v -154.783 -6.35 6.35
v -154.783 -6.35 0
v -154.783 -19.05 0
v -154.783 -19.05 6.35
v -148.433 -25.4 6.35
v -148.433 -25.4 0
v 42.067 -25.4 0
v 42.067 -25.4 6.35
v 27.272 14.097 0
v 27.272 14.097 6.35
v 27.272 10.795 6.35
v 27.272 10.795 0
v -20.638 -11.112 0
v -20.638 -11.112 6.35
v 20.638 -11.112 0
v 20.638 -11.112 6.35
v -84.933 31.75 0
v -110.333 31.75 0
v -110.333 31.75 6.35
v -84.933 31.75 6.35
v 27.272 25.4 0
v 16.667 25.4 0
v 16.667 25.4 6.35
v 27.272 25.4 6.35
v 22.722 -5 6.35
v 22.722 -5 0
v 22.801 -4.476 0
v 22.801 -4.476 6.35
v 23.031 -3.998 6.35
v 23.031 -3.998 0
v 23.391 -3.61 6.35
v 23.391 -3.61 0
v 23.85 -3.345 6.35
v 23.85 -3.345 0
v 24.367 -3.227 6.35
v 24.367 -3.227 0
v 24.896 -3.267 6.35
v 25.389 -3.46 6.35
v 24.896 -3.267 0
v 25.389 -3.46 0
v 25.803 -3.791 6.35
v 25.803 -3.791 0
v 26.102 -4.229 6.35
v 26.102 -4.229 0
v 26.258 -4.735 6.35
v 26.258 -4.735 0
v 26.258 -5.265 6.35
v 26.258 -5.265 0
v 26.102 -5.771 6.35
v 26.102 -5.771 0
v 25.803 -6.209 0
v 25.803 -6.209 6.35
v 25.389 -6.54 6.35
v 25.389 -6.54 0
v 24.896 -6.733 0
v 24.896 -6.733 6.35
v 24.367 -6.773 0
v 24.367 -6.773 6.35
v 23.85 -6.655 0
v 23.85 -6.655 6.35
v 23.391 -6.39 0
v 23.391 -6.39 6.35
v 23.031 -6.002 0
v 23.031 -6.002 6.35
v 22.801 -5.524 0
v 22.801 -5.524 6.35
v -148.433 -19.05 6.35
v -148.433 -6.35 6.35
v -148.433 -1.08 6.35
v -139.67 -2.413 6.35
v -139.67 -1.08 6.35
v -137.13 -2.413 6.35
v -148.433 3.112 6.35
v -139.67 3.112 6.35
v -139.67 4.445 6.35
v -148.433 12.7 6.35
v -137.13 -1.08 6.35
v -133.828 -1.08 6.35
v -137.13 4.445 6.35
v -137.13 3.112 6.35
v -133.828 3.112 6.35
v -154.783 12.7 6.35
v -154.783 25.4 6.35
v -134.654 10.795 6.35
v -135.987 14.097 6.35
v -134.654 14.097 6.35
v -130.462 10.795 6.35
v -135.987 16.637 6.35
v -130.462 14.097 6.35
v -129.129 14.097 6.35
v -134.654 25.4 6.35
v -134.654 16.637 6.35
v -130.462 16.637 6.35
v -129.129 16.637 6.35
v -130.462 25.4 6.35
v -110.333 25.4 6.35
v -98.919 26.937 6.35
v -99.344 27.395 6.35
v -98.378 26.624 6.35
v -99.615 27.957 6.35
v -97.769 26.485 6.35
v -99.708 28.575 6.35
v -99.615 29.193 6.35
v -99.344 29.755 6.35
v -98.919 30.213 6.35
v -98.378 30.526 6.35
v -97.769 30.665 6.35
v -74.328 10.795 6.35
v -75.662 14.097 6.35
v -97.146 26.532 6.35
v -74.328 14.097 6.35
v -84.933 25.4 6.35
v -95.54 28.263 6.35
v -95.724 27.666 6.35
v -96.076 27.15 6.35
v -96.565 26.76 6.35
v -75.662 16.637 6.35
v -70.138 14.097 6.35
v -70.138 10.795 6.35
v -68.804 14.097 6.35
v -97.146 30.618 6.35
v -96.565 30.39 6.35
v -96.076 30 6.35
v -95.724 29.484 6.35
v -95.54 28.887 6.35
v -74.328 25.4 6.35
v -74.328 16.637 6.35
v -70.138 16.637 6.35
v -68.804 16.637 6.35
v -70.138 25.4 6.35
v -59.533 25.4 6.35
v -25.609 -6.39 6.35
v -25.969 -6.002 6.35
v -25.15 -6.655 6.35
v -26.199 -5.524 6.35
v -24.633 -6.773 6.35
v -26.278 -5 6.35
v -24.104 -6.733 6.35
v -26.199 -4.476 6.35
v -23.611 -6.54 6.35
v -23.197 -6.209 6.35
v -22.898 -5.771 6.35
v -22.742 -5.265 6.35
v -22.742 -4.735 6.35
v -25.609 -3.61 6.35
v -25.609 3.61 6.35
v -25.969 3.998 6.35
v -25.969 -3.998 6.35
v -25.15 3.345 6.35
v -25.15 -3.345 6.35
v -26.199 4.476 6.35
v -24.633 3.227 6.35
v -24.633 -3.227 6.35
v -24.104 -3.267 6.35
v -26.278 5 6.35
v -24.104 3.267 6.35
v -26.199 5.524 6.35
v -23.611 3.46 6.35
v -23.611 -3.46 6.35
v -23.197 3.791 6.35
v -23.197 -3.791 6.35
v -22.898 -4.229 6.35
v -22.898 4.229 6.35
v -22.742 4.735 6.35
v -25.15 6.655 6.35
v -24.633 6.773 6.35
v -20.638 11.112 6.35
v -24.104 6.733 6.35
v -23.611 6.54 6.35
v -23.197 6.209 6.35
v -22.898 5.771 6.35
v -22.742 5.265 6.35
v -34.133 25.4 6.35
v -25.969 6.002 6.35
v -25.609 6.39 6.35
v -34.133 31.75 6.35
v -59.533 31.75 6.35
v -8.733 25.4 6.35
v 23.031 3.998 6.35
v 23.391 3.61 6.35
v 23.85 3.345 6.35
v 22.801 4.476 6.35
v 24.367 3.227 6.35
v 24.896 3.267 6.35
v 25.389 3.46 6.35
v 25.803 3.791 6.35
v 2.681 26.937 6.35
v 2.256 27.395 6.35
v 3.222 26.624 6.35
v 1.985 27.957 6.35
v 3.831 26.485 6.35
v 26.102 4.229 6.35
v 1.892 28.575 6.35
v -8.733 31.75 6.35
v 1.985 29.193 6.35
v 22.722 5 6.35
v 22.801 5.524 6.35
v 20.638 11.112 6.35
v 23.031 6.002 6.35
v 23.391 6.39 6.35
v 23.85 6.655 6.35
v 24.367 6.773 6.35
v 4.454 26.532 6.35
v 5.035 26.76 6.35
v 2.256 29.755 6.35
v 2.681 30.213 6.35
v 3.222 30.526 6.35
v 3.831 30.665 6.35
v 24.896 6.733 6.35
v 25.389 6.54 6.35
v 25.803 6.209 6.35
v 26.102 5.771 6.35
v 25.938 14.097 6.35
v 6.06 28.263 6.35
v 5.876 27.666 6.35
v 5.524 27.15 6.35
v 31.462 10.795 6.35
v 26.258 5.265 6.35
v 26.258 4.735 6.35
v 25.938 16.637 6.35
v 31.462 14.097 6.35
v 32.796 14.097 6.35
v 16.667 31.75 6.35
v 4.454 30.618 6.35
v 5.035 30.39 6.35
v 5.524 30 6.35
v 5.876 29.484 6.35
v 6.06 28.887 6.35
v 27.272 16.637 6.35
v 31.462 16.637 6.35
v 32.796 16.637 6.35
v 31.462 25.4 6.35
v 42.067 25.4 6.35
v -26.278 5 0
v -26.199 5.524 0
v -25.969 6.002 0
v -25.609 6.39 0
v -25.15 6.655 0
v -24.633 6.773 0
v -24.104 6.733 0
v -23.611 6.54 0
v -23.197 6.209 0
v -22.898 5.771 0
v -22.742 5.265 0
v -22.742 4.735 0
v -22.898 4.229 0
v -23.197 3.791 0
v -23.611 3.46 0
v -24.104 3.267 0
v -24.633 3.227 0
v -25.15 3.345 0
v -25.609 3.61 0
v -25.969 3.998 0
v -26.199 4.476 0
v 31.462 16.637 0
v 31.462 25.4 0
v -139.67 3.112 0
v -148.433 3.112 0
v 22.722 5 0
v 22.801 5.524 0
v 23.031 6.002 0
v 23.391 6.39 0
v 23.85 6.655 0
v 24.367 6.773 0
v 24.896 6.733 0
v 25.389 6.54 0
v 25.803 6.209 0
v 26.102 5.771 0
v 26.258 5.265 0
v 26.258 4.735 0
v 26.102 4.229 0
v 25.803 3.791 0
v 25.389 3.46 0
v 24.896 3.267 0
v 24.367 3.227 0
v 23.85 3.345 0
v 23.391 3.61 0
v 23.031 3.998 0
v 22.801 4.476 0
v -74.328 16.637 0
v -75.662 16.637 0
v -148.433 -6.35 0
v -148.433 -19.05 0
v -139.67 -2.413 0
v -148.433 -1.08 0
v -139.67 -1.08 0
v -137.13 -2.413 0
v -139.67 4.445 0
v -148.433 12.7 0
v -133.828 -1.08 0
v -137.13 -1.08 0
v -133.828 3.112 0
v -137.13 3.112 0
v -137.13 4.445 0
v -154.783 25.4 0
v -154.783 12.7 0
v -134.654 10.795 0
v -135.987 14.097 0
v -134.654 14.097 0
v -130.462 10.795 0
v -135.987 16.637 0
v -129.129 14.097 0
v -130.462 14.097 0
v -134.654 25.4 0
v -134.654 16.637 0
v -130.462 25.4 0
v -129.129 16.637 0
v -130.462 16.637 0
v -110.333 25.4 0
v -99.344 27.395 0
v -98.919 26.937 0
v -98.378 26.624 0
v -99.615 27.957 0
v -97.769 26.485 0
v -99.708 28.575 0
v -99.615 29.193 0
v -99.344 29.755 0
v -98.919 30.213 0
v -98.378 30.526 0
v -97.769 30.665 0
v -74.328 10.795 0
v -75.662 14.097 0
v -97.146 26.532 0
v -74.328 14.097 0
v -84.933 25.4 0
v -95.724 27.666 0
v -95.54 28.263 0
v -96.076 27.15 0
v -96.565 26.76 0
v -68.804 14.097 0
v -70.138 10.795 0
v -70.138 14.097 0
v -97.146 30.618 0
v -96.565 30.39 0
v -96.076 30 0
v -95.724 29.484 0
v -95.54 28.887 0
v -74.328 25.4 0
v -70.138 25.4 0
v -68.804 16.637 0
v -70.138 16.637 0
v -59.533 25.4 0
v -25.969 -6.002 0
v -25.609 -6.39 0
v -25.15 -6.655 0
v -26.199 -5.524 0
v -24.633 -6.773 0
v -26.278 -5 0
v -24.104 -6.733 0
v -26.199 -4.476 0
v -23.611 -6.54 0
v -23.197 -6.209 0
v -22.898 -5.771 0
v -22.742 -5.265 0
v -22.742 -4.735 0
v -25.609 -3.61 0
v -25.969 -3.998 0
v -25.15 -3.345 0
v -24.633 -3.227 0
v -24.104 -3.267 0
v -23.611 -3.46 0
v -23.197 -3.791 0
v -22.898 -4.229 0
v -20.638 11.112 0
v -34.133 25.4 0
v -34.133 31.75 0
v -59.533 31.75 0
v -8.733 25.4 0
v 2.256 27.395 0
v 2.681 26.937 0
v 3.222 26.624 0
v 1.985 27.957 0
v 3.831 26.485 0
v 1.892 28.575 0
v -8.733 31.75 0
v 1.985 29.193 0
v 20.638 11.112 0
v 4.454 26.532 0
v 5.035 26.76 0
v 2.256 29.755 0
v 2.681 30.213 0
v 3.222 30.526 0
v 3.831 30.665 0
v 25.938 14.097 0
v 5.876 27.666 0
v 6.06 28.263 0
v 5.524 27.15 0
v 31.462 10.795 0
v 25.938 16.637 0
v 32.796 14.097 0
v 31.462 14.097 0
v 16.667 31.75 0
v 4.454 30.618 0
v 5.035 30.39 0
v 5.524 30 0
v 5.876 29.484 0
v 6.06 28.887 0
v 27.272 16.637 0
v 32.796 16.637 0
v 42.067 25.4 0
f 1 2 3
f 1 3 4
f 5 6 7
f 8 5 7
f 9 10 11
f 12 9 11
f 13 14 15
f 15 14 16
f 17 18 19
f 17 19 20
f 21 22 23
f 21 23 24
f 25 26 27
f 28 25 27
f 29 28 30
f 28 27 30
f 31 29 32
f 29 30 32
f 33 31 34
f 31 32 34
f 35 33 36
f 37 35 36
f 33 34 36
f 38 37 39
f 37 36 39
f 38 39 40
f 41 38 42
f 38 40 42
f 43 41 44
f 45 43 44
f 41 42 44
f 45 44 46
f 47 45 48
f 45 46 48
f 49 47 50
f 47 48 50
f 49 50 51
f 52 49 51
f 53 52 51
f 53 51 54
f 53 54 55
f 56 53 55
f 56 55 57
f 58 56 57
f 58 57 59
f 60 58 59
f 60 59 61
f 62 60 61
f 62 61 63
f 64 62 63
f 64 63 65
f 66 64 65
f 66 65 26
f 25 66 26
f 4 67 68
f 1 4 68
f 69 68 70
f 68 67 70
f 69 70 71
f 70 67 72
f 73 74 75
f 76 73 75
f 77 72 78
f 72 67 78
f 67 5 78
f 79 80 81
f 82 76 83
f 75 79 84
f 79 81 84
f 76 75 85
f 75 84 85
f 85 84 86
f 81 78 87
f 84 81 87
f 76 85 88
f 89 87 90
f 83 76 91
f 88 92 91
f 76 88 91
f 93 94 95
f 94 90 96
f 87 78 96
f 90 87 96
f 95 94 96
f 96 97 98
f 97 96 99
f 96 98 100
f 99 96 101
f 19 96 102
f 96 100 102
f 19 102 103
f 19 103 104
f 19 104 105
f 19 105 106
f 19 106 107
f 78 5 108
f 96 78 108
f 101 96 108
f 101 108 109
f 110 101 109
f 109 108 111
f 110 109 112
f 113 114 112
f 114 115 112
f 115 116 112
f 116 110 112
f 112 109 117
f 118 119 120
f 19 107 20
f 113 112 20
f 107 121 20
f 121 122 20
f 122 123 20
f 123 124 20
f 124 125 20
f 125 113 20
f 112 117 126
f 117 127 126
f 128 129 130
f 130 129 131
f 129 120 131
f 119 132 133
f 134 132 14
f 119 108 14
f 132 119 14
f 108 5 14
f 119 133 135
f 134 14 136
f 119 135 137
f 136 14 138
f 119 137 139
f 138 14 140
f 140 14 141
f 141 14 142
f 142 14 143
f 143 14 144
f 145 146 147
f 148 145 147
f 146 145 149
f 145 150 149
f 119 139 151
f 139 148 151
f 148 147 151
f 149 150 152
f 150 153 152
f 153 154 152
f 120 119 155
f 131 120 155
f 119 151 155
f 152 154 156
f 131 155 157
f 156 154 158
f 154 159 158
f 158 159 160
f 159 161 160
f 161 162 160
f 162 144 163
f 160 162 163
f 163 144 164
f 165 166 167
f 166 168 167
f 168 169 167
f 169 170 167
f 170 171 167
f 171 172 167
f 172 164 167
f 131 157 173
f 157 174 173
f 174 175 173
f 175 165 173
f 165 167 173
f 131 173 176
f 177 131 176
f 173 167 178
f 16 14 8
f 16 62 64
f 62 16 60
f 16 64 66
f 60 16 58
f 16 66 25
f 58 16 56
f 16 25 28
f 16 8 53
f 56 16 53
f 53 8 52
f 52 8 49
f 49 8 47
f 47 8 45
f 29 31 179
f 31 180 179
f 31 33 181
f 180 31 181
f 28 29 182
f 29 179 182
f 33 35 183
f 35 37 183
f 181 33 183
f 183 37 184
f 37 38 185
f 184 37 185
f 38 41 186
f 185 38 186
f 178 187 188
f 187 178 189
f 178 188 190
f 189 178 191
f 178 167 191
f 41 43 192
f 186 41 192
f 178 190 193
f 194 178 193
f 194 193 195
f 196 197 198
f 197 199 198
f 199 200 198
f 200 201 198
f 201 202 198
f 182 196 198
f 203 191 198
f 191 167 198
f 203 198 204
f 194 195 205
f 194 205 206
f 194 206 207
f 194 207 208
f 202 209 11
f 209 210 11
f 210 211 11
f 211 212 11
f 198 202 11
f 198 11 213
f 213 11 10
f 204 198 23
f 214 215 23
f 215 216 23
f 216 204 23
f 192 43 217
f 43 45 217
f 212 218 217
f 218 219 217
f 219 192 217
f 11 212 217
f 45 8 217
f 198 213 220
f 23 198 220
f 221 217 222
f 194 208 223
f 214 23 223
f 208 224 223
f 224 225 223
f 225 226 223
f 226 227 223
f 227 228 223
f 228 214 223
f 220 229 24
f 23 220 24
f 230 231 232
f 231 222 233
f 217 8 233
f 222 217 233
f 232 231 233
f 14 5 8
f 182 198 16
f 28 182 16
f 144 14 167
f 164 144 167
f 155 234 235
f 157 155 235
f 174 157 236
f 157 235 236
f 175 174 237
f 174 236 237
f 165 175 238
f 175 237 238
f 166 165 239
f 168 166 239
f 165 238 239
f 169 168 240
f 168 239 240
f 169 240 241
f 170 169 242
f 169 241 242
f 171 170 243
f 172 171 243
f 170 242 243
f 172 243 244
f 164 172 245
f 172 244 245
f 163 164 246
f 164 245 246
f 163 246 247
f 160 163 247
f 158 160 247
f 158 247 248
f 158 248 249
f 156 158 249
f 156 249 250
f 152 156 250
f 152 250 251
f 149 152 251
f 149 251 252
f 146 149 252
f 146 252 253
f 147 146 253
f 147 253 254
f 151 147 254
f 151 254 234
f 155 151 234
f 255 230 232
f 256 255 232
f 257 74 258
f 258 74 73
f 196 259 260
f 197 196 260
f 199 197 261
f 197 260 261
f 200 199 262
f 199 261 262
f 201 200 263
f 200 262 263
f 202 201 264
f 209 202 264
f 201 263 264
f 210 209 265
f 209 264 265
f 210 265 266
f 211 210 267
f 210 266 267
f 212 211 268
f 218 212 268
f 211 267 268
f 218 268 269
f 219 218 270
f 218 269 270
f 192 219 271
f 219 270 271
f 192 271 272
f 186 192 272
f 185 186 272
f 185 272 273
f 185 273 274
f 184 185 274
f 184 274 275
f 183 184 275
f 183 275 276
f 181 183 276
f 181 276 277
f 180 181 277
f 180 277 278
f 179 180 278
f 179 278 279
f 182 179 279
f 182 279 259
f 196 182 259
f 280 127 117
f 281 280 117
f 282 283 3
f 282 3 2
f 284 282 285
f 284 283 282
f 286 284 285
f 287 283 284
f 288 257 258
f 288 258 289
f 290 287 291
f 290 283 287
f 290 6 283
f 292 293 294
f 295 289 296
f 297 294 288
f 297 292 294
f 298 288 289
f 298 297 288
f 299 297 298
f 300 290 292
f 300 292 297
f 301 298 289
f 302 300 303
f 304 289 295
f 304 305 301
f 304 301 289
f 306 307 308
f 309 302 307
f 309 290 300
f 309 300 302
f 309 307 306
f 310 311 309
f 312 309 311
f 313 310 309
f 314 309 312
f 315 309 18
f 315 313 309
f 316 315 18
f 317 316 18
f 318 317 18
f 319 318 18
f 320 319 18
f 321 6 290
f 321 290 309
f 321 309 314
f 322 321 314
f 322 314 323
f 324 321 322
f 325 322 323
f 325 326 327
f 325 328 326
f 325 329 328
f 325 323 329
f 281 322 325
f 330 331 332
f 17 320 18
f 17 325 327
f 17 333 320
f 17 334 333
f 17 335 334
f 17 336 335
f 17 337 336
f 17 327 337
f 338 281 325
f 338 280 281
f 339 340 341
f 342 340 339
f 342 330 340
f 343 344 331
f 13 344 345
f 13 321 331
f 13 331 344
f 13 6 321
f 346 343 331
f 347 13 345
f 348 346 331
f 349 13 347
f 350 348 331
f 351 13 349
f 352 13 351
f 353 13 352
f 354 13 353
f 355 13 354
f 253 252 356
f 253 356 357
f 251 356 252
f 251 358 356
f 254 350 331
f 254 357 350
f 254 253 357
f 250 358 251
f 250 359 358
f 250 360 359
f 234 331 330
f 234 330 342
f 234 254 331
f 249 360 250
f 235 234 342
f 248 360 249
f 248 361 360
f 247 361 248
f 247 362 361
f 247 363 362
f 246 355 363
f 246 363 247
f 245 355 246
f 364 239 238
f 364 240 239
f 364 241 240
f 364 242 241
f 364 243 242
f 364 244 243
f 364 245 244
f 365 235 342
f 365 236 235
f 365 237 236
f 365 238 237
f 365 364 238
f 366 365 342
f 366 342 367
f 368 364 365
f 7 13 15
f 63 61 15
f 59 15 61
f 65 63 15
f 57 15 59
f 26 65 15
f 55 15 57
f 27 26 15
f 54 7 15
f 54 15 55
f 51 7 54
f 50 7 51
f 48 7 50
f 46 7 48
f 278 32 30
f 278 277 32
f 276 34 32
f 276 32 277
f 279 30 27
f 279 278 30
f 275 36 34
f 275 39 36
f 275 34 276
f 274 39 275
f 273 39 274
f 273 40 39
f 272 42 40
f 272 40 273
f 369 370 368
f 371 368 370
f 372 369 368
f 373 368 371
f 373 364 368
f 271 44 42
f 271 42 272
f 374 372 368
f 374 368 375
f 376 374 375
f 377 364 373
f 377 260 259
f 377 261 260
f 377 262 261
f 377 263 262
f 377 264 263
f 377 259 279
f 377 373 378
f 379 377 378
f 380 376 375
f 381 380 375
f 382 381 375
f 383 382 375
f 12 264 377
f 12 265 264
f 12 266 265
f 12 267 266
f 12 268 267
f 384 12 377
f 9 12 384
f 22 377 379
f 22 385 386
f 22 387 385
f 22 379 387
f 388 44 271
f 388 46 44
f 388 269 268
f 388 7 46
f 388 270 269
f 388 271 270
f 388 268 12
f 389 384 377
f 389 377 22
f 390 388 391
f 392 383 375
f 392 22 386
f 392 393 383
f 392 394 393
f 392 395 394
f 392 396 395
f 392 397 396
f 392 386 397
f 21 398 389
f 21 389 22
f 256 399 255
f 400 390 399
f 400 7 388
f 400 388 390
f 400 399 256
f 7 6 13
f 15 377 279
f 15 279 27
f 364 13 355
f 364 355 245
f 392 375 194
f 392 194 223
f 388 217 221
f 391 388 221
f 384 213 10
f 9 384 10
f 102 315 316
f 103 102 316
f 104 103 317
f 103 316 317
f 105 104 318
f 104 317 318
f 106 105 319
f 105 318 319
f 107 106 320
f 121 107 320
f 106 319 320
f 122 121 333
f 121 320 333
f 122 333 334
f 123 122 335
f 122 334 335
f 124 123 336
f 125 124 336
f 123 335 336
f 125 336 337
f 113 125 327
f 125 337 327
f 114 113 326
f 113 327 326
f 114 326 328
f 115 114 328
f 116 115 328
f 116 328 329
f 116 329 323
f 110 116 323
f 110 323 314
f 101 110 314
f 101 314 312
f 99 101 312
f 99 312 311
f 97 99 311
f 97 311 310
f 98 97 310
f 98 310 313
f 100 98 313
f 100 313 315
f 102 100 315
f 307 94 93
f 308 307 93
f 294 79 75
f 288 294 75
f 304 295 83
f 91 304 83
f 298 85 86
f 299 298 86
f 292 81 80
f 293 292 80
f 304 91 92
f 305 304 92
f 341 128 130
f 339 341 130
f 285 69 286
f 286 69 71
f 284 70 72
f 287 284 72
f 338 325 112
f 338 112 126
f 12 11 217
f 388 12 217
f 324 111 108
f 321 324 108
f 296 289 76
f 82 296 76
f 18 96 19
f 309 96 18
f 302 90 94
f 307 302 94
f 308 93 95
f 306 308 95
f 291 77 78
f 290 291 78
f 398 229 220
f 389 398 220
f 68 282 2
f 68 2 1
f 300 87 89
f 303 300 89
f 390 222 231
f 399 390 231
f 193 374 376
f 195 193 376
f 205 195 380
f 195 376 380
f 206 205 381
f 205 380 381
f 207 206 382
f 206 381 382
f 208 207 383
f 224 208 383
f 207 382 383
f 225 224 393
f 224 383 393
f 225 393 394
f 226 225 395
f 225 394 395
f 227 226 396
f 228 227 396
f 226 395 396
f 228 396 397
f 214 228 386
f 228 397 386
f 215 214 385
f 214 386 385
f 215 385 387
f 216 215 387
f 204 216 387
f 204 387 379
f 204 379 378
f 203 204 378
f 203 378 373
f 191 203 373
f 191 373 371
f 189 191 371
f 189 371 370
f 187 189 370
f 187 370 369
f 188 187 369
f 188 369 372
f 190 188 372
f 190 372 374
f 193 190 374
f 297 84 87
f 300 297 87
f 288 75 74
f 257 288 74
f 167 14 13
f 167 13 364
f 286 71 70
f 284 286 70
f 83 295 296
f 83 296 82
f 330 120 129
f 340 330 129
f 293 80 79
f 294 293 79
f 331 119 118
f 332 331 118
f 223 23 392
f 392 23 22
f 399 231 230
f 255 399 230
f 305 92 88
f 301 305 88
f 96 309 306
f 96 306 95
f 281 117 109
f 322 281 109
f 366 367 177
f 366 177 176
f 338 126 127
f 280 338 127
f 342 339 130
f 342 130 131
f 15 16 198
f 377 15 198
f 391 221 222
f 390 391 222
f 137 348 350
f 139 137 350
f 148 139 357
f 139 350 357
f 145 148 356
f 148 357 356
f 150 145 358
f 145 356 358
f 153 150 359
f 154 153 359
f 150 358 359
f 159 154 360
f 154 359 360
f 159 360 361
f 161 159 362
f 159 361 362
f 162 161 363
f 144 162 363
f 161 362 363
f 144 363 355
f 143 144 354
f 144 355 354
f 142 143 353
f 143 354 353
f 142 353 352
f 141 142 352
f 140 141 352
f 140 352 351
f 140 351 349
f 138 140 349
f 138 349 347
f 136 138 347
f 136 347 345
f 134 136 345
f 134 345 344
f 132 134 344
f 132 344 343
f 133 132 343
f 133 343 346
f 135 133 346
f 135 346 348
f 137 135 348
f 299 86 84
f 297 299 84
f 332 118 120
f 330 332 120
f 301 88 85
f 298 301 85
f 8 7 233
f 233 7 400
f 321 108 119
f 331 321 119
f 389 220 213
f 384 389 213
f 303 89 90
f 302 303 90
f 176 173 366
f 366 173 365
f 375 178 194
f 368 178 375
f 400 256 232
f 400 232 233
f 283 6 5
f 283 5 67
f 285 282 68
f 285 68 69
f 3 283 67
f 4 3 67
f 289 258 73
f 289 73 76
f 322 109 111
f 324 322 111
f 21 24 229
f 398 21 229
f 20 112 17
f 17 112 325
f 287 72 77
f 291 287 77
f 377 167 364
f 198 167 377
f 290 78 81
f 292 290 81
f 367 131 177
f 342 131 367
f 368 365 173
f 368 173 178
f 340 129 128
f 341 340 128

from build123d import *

# Parameters (mm, degrees)
SKETCH1_W           = 190.5
SKETCH1_H           = 50.8
BOSS_EXTRUDE1_DEPTH = 6.35
SKETCH2_W           = 41.275
SKETCH2_H           = 22.225
CUT_EXTRUDE1_DEPTH  = 151.724377554
SKETCH3_W           = 25.4
SKETCH3_H           = 6.35
BOSS_EXTRUDE2_DEPTH = 6.35
LPATTERN1_COUNT     = 3
LPATTERN1_PITCH     = 50.8
SKETCH4_W           = 6.35
SKETCH4_H           = 12.7
BOSS_EXTRUDE3_DEPTH = 6.35
LPATTERN2_COUNT     = 2
LPATTERN2_PITCH     = 31.75
CUT_EXTRUDE2_DEPTH  = 6.35
SKETCH6_R           = 2.0955
CUT_EXTRUDE3_DEPTH  = 159.133368044
CUT_EXTRUDE4_DEPTH  = 159.133368044
SKETCH8_R           = 1.778
CUT_EXTRUDE5_DEPTH  = 159.133368044


with BuildPart() as part:
    # Sketch1 → Boss-Extrude1 (new body)
    with BuildSketch(Plane.XY):
        with Locations((-53.183, 0)):
            Rectangle(SKETCH1_W, SKETCH1_H)
    extrude(amount=BOSS_EXTRUDE1_DEPTH)

    # Sketch2 → Cut-Extrude1 (cut, through all)
    with BuildSketch(Plane.XY.offset(6.35)):
        Rectangle(SKETCH2_W, SKETCH2_H)
    extrude(amount=-CUT_EXTRUDE1_DEPTH, mode=Mode.SUBTRACT)

    # Sketch3 → Boss-Extrude2 (add)
    with BuildSketch(Plane(origin=(0, 25.4, 0), x_dir=(1, 0, 0), z_dir=(0, 1, 0))):
        with Locations((3.967, -3.175)):
            Rectangle(SKETCH3_W, SKETCH3_H)
    boss_extrude2 = extrude(amount=BOSS_EXTRUDE2_DEPTH)

    # LPattern1: Boss-Extrude2 ×3
    with Locations(*[(-i * LPATTERN1_PITCH, 0, 0) for i in range(1, LPATTERN1_COUNT)]):
        add(boss_extrude2)

    # Sketch4 → Boss-Extrude3 (add)
    with BuildSketch(Plane.ZY.offset(148.433)):
        with Locations((3.175, 19.05)):
            Rectangle(SKETCH4_W, SKETCH4_H)
    boss_extrude3 = extrude(amount=BOSS_EXTRUDE3_DEPTH)

    # LPattern2: Boss-Extrude3 ×2
    with Locations(*[(0, -i * LPATTERN2_PITCH, 0) for i in range(1, LPATTERN2_COUNT)]):
        add(boss_extrude3)

    # Sketch5 → Cut-Extrude2 (cut)
    with BuildSketch(Plane.XY.offset(6.35)):
        Polygon((31.4625, 25.4), (27.2715, 25.4), (27.2715, 16.637), (25.938, 16.637), (25.938, 14.097), (27.2715, 14.097), (27.2715, 10.795), (31.4625, 10.795), (31.4625, 14.097), (32.796, 14.097), (32.796, 16.637), (31.4625, 16.637), align=None)
        Polygon((-70.1375, 25.4), (-74.3285, 25.4), (-74.3285, 16.637), (-75.662, 16.637), (-75.662, 14.097), (-74.3285, 14.097), (-74.3285, 10.795), (-70.1375, 10.795), (-70.1375, 14.097), (-68.804, 14.097), (-68.804, 16.637), (-70.1375, 16.637), align=None)
        Polygon((-130.4625, 25.4), (-134.6535, 25.4), (-134.6535, 16.637), (-135.987, 16.637), (-135.987, 14.097), (-134.6535, 14.097), (-134.6535, 10.795), (-130.4625, 10.795), (-130.4625, 14.097), (-129.129, 14.097), (-129.129, 16.637), (-130.4625, 16.637), align=None)
    extrude(amount=-CUT_EXTRUDE2_DEPTH, mode=Mode.SUBTRACT)

    # Sketch6 → Cut-Extrude3 (cut, through all)
    with BuildSketch(Plane(origin=(0, 0, 0), x_dir=(-1, 0, 0), z_dir=(0, 0, -1))):
        with Locations((-3.98760291, 28.575)):
            Circle(SKETCH6_R)
        with Locations((97.61239709, 28.575)):
            Circle(SKETCH6_R)
    extrude(amount=-CUT_EXTRUDE3_DEPTH, mode=Mode.SUBTRACT)

    # Sketch7 → Cut-Extrude4 (cut, through all)
    with BuildSketch(Plane.XY.offset(6.35)):
        Polygon((-148.433, 3.1115), (-148.433, -1.0795), (-139.67, -1.0795), (-139.67, -2.413), (-137.13, -2.413), (-137.13, -1.0795), (-133.828, -1.0795), (-133.828, 3.1115), (-137.13, 3.1115), (-137.13, 4.445), (-139.67, 4.445), (-139.67, 3.1115), align=None)
    extrude(amount=-CUT_EXTRUDE4_DEPTH, mode=Mode.SUBTRACT)

    # Sketch8 → Cut-Extrude5 (cut, through all)
    with BuildSketch(Plane(origin=(0, 0, 0), x_dir=(-1, 0, 0), z_dir=(0, 0, -1))):
        with Locations((24.5, -5)):
            Circle(SKETCH8_R)
        with Locations((24.5, 5)):
            Circle(SKETCH8_R)
        with Locations((-24.5, 5)):
            Circle(SKETCH8_R)
        with Locations((-24.5, -5)):
            Circle(SKETCH8_R)
    extrude(amount=-CUT_EXTRUDE5_DEPTH, mode=Mode.SUBTRACT)


solid = part.part
